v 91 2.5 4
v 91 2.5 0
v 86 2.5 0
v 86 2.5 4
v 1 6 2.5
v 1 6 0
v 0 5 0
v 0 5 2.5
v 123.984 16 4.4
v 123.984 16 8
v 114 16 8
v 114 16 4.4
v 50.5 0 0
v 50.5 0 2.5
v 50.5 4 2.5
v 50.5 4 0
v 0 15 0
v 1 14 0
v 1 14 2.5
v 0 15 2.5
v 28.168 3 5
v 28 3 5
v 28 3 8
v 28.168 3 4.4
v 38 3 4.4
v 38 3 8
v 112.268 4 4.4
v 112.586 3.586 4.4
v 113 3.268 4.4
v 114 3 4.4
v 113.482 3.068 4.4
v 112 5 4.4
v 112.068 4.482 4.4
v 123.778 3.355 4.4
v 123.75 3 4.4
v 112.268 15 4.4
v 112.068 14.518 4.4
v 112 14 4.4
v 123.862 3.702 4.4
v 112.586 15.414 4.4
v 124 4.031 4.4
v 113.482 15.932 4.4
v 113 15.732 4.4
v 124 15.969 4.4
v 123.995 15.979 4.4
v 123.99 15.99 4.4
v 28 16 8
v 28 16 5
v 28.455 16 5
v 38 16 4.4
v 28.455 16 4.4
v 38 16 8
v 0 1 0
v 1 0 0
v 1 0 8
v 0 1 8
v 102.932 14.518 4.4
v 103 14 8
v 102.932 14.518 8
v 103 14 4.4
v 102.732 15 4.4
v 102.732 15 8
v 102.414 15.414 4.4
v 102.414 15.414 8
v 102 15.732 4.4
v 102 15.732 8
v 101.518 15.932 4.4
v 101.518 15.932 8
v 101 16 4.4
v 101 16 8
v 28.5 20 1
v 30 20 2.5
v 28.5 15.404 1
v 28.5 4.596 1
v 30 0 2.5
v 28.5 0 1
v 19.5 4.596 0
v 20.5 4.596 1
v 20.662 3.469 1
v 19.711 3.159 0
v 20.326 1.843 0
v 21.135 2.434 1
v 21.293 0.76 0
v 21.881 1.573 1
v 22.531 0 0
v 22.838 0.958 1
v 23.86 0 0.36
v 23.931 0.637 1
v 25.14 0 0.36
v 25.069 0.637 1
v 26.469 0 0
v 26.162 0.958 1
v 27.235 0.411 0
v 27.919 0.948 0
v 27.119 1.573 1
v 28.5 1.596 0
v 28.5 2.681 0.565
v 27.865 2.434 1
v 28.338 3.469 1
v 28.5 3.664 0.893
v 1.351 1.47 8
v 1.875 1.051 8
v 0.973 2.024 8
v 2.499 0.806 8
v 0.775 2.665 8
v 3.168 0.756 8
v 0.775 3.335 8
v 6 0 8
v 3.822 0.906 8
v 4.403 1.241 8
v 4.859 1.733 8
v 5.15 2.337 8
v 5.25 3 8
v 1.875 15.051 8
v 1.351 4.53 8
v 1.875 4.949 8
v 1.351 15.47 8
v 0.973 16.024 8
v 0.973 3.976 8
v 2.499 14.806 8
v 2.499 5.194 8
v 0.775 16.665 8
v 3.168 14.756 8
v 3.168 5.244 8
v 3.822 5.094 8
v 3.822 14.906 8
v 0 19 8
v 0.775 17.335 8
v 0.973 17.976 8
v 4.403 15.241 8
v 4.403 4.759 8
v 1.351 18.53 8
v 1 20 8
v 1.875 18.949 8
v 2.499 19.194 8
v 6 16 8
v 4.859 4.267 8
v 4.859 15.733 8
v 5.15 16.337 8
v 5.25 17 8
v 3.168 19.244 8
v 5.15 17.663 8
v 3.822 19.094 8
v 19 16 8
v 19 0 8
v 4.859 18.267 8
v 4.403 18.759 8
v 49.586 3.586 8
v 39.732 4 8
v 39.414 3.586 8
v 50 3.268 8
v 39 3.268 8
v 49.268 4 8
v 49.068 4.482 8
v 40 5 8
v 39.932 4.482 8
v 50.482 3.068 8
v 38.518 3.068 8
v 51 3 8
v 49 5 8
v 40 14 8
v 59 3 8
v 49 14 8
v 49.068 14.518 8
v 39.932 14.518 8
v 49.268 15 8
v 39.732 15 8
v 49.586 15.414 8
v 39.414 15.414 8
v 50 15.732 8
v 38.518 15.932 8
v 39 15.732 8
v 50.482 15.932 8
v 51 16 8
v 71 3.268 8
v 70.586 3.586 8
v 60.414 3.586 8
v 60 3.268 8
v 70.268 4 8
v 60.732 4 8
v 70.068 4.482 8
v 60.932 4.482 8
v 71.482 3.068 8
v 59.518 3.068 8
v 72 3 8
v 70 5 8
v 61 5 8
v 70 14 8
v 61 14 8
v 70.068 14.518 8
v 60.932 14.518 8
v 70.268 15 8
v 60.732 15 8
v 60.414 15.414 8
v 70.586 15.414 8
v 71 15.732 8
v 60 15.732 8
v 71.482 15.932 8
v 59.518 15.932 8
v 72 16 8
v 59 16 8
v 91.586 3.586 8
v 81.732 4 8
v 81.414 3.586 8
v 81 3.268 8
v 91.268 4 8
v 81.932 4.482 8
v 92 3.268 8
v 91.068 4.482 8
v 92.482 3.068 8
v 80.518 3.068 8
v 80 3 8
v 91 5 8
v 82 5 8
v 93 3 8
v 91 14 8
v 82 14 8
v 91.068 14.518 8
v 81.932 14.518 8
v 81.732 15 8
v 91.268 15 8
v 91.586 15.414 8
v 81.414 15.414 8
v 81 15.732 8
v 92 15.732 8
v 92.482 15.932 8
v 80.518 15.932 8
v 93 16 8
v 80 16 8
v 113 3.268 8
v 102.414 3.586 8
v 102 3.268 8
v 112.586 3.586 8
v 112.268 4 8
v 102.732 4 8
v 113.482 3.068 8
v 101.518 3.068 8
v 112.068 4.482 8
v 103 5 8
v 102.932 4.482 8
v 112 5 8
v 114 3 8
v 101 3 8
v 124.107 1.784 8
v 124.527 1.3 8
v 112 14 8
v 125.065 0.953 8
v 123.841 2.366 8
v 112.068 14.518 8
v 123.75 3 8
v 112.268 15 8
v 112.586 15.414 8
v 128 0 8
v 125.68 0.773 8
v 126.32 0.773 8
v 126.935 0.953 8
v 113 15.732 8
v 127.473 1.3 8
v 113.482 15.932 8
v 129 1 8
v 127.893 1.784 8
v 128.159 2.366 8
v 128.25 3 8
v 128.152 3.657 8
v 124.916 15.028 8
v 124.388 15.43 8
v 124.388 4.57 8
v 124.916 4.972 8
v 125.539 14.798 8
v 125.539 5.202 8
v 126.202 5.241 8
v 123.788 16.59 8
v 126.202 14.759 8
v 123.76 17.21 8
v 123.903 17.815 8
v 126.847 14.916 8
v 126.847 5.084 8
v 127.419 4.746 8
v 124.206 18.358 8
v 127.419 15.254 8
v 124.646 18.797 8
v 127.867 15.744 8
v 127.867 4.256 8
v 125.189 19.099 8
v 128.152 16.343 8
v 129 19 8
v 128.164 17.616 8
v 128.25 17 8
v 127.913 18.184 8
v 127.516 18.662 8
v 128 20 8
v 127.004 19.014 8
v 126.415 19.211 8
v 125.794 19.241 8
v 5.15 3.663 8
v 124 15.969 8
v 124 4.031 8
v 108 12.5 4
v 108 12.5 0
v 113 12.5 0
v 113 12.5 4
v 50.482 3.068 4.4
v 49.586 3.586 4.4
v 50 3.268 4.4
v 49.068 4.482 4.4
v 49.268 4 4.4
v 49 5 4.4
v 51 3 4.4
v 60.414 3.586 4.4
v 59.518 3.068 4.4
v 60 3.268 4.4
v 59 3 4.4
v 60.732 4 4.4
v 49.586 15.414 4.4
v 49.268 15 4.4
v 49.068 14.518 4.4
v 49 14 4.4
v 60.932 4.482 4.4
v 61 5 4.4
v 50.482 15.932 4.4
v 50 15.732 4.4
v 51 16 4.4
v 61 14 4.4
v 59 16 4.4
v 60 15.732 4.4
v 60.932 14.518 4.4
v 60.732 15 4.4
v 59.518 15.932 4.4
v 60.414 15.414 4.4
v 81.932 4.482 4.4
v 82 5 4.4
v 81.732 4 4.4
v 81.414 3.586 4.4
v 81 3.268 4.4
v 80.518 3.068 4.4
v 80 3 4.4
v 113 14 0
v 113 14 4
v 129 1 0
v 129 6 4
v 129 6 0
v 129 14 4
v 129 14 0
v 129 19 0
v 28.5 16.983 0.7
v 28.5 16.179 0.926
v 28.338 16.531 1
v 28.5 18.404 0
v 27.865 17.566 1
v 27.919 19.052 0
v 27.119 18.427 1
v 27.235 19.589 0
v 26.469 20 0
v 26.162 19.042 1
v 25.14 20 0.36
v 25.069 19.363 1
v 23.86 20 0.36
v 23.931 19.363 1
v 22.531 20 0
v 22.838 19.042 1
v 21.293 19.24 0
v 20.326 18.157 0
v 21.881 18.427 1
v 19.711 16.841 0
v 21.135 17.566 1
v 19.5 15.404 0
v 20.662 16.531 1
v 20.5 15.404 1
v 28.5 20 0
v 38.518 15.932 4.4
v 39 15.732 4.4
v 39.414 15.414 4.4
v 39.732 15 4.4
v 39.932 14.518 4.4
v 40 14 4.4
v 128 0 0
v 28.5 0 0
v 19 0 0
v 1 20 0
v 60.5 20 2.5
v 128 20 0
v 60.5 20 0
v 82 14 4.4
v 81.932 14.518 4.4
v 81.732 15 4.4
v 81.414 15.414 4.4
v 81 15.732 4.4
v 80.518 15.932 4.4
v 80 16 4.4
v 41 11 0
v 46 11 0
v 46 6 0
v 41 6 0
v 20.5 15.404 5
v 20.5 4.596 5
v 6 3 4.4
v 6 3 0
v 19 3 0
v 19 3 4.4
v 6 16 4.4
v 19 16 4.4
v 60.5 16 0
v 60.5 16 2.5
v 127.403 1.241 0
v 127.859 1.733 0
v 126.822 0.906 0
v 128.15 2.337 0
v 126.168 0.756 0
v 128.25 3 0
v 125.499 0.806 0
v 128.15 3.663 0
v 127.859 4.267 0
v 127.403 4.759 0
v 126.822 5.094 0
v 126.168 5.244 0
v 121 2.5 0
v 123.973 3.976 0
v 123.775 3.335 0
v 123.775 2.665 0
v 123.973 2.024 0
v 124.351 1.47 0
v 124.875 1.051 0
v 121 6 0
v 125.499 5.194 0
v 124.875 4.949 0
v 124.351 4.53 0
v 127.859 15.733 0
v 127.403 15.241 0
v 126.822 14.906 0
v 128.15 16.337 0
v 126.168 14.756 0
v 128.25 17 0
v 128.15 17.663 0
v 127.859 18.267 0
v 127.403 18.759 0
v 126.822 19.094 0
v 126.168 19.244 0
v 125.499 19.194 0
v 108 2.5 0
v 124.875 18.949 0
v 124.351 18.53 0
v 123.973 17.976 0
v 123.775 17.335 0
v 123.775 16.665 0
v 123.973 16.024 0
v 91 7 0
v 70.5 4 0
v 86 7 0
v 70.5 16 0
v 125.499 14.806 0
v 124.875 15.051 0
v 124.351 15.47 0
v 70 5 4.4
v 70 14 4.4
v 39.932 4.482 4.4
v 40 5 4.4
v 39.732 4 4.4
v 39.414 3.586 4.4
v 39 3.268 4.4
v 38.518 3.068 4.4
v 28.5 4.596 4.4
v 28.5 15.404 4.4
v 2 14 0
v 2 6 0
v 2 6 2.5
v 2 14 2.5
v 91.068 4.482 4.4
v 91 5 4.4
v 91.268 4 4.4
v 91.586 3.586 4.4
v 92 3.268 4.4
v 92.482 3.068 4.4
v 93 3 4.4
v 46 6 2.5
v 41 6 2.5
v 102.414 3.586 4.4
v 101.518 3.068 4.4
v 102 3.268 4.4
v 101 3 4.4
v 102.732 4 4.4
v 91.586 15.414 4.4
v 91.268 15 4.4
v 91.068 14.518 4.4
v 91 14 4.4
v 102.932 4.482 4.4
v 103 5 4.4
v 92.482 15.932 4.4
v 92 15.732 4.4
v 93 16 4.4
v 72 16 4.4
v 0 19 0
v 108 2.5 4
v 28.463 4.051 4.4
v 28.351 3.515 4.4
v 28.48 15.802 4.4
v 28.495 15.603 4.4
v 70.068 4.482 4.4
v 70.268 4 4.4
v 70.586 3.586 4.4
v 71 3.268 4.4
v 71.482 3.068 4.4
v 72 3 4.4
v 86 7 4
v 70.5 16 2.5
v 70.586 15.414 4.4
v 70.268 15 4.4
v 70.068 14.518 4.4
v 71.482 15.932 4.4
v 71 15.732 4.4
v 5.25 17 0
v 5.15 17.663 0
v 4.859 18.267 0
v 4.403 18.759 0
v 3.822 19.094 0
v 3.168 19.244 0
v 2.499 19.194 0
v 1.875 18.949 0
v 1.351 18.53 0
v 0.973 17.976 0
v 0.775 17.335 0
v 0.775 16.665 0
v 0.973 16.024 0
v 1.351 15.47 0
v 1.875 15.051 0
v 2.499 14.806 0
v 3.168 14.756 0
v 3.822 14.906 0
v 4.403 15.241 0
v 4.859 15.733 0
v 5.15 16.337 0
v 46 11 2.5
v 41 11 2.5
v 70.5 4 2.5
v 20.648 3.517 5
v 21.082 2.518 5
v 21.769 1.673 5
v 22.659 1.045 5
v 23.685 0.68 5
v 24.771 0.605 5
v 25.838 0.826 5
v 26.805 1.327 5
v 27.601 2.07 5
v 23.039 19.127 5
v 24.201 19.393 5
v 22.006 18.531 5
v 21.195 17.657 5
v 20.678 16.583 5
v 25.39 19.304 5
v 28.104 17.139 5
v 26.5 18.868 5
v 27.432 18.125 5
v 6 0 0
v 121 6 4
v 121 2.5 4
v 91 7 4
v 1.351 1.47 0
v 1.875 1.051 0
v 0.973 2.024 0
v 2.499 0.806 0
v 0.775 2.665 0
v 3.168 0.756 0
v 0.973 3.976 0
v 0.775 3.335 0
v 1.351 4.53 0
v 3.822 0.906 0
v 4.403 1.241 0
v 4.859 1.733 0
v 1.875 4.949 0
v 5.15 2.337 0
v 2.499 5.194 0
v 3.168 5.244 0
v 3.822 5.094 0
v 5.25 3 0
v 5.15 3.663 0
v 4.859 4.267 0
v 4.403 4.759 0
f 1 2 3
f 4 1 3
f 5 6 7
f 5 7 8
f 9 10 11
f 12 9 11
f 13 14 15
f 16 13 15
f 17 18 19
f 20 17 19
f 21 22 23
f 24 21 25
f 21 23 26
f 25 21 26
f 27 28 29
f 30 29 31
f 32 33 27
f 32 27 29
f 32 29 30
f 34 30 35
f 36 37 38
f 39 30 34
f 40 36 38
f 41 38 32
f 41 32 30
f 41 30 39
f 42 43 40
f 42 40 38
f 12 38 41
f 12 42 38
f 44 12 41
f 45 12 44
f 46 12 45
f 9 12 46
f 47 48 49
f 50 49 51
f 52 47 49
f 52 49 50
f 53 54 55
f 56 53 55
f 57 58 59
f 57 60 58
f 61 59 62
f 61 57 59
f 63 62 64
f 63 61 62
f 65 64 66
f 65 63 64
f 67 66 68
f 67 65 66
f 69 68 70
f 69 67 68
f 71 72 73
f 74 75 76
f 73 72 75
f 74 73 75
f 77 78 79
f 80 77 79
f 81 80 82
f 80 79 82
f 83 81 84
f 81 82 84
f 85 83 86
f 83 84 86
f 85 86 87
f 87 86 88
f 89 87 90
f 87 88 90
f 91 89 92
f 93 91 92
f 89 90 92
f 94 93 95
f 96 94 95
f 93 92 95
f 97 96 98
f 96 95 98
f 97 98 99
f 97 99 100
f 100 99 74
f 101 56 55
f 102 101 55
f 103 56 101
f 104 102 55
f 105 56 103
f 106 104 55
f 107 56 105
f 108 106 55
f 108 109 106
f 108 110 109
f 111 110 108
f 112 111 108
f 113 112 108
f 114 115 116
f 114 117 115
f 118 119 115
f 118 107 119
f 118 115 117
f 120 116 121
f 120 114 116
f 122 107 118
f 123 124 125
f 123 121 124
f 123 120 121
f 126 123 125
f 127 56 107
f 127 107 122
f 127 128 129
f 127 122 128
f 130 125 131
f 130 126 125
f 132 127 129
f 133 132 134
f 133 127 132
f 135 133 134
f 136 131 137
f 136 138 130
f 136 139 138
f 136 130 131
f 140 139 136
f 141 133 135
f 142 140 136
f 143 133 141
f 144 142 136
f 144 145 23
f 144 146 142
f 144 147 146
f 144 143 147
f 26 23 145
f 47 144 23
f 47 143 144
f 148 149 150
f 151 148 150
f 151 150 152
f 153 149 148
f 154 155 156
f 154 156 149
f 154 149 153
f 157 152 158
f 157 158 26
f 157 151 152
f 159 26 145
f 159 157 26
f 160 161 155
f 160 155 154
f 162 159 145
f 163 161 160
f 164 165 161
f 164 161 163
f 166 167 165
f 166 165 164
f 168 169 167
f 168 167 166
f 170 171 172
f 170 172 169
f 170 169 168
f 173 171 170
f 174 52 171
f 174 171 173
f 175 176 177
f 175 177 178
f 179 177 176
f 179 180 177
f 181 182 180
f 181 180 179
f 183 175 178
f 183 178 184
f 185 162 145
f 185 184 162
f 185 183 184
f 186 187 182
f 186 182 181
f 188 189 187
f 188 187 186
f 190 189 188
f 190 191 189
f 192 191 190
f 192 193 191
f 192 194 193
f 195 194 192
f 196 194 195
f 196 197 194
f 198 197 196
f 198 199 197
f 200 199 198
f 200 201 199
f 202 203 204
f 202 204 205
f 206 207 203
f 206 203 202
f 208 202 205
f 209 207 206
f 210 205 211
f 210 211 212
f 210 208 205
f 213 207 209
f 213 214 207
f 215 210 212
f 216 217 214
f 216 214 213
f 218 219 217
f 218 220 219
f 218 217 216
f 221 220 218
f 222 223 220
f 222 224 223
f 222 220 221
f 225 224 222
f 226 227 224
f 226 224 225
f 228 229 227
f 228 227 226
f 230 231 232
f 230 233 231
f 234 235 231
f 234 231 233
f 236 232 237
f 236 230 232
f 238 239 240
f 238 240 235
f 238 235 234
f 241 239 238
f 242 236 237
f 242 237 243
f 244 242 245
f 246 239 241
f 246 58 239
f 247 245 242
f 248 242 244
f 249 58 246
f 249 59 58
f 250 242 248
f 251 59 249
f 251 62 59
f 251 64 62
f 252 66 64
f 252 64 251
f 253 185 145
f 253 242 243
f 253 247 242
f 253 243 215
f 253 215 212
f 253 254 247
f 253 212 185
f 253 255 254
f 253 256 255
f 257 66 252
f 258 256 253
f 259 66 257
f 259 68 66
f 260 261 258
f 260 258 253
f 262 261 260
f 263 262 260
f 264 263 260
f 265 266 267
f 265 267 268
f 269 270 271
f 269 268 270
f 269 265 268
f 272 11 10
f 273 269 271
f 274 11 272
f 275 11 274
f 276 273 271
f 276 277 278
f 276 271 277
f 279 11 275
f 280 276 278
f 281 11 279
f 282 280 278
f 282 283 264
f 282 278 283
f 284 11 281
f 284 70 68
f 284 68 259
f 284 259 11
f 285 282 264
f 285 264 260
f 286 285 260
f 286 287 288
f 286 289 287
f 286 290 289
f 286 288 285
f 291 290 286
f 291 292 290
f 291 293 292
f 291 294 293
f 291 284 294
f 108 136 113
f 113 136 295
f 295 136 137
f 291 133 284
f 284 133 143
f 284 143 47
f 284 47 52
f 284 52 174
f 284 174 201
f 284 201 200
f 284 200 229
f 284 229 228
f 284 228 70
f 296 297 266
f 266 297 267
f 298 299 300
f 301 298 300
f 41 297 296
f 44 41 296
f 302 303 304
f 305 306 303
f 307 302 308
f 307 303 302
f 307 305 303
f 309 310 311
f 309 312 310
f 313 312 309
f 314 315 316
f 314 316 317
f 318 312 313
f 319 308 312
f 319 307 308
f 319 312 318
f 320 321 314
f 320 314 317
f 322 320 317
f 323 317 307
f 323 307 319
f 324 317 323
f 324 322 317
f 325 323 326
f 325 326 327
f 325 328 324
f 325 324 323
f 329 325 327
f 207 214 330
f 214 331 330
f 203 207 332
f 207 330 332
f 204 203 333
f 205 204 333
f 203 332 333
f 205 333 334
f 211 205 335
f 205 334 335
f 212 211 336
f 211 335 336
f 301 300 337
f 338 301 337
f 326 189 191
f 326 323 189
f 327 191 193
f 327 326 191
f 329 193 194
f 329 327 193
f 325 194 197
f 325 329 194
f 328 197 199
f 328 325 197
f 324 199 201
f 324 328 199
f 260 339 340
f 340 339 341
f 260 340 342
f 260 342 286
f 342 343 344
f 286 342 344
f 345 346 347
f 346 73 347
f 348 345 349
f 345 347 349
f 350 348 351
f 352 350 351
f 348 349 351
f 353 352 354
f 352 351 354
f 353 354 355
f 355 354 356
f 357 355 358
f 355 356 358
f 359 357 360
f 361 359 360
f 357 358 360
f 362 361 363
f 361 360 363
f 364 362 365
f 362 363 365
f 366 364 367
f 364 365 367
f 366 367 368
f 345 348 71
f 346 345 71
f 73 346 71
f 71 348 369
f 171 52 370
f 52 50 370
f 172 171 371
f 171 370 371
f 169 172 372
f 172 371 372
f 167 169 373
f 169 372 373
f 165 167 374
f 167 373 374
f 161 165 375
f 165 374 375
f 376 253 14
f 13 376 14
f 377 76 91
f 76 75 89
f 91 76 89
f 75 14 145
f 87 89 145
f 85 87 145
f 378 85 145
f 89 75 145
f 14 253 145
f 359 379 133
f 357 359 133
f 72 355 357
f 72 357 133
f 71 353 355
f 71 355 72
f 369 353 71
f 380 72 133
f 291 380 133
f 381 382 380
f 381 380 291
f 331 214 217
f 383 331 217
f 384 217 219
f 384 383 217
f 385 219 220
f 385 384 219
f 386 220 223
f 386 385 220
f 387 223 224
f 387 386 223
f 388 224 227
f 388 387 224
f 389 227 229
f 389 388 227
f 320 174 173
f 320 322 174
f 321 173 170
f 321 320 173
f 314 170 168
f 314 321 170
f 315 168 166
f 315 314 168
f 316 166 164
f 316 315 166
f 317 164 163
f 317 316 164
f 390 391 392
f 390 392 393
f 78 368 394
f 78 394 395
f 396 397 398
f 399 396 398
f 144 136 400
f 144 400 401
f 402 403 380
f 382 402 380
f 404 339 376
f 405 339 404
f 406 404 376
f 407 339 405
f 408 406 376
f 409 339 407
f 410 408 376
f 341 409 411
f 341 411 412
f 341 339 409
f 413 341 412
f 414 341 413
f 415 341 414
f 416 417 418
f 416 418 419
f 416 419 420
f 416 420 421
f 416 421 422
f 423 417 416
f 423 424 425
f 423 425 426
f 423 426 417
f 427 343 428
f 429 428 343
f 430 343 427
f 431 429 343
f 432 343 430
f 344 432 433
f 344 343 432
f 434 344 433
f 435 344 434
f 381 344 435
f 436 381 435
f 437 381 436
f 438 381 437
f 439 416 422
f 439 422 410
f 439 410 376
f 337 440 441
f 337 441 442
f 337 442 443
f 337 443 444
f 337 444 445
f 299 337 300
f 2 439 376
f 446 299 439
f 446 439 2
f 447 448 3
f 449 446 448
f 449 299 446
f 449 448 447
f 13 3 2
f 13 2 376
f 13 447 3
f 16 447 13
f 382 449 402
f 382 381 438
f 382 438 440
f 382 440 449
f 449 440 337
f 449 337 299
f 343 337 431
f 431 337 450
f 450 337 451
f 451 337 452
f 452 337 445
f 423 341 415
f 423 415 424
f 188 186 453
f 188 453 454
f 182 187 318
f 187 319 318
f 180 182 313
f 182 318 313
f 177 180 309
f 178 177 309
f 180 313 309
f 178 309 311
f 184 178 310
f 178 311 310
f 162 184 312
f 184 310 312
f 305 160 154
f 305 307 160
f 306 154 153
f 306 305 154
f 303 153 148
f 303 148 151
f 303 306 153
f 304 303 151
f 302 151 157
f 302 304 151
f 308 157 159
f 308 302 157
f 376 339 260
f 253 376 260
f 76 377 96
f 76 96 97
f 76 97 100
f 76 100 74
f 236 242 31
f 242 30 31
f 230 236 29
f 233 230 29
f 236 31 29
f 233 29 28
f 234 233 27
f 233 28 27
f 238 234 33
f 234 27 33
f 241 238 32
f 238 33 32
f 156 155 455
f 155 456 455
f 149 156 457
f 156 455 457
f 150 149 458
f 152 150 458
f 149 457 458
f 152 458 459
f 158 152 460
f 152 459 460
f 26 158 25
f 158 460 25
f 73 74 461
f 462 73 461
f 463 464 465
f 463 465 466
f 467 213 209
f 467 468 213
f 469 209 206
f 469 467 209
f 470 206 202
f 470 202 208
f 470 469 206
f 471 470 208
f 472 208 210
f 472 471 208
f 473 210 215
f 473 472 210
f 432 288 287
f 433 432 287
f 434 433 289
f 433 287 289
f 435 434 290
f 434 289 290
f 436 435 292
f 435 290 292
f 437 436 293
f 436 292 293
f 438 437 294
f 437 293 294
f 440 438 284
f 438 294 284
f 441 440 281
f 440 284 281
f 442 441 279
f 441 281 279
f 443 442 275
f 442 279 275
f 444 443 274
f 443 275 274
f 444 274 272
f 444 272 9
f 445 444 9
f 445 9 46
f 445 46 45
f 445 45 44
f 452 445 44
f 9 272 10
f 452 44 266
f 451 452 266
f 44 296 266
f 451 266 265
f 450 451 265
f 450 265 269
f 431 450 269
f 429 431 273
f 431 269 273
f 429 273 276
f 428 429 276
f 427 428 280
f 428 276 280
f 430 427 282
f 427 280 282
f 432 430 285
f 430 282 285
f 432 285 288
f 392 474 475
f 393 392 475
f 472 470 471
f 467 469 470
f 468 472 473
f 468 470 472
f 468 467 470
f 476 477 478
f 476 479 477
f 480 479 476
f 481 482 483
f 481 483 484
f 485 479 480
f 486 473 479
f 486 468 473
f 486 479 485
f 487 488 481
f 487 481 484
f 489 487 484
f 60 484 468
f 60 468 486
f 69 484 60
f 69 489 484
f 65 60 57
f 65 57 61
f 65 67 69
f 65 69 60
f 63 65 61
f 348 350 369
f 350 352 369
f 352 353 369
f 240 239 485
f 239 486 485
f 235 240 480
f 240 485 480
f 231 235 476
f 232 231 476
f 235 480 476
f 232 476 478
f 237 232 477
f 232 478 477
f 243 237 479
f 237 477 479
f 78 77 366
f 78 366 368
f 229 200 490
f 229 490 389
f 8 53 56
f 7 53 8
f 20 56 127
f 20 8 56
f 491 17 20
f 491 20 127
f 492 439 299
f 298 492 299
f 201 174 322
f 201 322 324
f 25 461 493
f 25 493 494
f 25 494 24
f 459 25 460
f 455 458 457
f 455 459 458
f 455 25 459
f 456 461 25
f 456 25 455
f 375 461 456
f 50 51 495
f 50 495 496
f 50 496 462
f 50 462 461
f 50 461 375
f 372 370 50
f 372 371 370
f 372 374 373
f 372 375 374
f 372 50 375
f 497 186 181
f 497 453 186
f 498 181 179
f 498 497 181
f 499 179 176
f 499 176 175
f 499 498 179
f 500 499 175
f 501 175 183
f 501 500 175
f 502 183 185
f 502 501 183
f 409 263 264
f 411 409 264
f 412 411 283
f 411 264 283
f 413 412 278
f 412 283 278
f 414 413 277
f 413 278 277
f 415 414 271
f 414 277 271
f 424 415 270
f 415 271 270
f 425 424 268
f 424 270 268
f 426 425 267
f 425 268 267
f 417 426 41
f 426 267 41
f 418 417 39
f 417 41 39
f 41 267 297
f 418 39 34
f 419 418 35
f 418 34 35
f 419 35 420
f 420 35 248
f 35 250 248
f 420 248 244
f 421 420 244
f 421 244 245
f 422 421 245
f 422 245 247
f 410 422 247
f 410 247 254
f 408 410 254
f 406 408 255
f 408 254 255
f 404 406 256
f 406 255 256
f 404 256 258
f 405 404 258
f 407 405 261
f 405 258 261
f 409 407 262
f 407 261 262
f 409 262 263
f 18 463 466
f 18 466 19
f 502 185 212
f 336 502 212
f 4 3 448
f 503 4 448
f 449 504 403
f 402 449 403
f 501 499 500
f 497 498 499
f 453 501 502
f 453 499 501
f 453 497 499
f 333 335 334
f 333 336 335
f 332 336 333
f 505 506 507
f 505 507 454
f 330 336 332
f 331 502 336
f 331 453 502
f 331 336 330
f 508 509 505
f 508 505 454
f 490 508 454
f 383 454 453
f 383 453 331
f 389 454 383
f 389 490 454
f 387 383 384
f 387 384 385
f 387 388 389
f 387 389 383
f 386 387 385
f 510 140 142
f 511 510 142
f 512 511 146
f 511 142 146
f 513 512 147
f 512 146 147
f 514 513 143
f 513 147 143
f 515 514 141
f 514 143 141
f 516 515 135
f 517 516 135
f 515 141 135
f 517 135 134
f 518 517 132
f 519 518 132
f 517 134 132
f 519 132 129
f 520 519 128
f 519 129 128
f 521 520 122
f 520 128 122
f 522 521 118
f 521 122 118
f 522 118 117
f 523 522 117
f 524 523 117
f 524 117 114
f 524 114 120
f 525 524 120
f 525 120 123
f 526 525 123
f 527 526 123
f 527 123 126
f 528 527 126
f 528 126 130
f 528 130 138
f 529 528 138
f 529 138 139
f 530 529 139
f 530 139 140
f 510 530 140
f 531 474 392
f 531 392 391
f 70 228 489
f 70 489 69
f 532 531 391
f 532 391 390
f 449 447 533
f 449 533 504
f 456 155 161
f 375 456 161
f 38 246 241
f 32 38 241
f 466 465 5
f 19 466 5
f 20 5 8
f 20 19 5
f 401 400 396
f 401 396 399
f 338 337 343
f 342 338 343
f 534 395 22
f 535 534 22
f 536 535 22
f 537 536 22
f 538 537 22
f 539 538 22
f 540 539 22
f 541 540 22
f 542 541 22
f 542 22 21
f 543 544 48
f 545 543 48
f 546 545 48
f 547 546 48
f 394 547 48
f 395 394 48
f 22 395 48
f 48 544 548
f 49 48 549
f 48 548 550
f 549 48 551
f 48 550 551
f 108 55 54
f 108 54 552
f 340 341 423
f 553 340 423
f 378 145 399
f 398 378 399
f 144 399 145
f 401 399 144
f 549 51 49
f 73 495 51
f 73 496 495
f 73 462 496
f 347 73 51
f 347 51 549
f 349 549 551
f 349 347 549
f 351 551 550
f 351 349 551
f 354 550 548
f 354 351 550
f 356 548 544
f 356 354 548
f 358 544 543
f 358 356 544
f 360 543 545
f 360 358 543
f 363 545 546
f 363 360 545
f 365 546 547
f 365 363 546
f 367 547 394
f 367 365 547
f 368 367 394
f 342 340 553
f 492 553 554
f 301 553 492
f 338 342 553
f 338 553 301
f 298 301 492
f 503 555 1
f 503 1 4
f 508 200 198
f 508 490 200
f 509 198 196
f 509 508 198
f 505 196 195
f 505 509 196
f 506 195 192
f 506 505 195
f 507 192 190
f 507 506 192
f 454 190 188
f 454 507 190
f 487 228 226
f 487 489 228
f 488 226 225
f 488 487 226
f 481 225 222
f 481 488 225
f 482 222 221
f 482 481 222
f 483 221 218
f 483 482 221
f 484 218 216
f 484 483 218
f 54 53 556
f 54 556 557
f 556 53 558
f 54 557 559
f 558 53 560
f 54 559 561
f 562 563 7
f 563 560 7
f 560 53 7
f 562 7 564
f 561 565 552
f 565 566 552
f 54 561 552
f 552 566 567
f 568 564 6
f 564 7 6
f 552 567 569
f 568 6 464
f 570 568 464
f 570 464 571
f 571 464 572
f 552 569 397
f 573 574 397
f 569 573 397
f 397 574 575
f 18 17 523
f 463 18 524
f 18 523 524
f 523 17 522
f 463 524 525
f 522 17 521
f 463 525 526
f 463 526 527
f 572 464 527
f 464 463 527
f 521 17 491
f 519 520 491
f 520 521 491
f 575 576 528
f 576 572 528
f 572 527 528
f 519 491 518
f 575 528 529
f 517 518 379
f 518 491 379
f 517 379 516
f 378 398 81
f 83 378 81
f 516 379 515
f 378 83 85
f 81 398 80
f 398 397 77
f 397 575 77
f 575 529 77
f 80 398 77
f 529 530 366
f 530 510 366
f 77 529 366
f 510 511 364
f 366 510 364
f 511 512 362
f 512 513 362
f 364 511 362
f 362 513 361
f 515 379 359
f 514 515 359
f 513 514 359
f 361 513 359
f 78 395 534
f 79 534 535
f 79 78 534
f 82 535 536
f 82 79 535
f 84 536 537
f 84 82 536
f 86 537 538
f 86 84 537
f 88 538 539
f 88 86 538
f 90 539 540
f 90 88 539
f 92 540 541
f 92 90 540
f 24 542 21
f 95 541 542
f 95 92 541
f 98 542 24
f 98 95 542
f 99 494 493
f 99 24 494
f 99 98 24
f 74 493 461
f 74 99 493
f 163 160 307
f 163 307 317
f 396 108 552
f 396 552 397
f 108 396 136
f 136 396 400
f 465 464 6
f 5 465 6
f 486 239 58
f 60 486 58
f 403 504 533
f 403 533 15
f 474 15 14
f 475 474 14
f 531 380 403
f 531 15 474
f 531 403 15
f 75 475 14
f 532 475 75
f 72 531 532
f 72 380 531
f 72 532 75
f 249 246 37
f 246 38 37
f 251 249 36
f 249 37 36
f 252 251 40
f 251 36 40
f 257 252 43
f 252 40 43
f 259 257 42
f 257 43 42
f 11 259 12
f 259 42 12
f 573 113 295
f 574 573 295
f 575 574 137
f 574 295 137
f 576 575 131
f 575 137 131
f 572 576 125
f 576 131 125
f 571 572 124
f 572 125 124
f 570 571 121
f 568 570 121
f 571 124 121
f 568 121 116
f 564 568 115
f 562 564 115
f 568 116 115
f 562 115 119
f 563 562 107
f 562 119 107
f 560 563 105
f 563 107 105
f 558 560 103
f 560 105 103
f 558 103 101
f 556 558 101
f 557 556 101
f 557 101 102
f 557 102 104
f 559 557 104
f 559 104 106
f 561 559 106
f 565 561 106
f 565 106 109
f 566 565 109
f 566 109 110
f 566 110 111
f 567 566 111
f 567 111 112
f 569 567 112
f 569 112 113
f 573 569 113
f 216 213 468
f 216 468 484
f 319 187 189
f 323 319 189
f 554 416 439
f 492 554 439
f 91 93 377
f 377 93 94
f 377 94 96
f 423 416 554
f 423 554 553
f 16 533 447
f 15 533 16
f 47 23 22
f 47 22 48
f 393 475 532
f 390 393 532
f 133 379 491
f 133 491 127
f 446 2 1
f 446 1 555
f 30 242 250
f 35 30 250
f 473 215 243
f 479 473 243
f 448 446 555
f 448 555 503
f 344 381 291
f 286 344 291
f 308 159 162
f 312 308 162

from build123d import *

# Parameters (mm, degrees)
SKETCH1_W               = 129
SKETCH1_H               = 20
BOSS_EXTRUDE1_DEPTH     = 8
SKETCH2_W               = 13
SKETCH2_H               = 15
SKETCH2_W_2             = 12
SKETCH2_H_2             = 13
CUT_EXTRUDE4_DEPTH      = 3.6
SKETCH2_5_R             = 2.25
CUT_EXTRUDE7_DEPTH      = 131.786084887
CUT_EXTRUDE8_DEPTH      = 131.615313038
CUT_EXTRUDE8_DEPTH_BACK = 131.615313038
SKETCH3_W               = 13
SKETCH3_H               = 3
CUT_EXTRUDE9_DEPTH      = 5
CHAMFER1_SIZE           = 1
SKETCH5_W               = 42
SKETCH5_H               = 20
SKETCH5_W_2             = 2
SKETCH5_H_2             = 8
CUT_EXTRUDE10_DEPTH     = 2.5
CHAMFER2_DEPTH          = 20
SKETCH6_W               = 5
SKETCH6_H               = 4.5
SKETCH6_W_2             = 8
SKETCH6_H_2             = 3.5
CUT_EXTRUDE11_DEPTH     = 4
SKETCH7_W               = 20
SKETCH7_H               = 4
SKETCH7_W_2             = 10
SKETCH7_W_3             = 5
SKETCH7_H_2             = 5
BOSS_EXTRUDE2_DEPTH     = 2.5
CHAMFER3_SIZE           = 1
FILLET1_R               = 2
CHAMFER4_SIZE           = 1


with BuildPart() as part:
    # Sketch1 → Boss-Extrude1 (new body)
    with BuildSketch(Plane.XY):
        with Locations((64.5, 10)):
            Rectangle(SKETCH1_W, SKETCH1_H)
    extrude(amount=BOSS_EXTRUDE1_DEPTH)

    # Sketch2 → Cut-Extrude4 (cut)
    with BuildSketch(Plane.XY.offset(8)):
        with Locations((12.5, 8.5)):
            Rectangle(SKETCH2_W, SKETCH2_H)
        with Locations((55, 9.5)):
            Rectangle(SKETCH2_W_2, SKETCH2_H_2)
        with Locations((34, 9.5)):
            Rectangle(SKETCH2_W_2, SKETCH2_H_2)
        with Locations((76, 9.5)):
            Rectangle(SKETCH2_W_2, SKETCH2_H_2)
        with Locations((97, 9.5)):
            Rectangle(SKETCH2_W_2, SKETCH2_H_2)
        with BuildLine():
            Line((112, 16), (112, 3))
            Line((112, 3), (123.75, 3))
            ThreePointArc((123.75, 3), (123.813393039, 3.530330086), (124, 4.030776406))
            Line((124, 4.030776406), (124, 15.969223594))
            ThreePointArc((124, 15.969223594), (123.992158813, 15.984581975), (123.984435563, 16))
            Line((123.984435563, 16), (112, 16))
        make_face()
    extrude(amount=-CUT_EXTRUDE4_DEPTH, mode=Mode.SUBTRACT)

    # Sketch2<5> → Cut-Extrude7 (cut, through all)
    with BuildSketch(Plane.XY.offset(8)):
        with Locations((126, 3)):
            Circle(SKETCH2_5_R)
        with Locations((126, 17)):
            Circle(SKETCH2_5_R)
        with Locations((3, 17)):
            Circle(SKETCH2_5_R)
        with Locations((3, 3)):
            Circle(SKETCH2_5_R)
    extrude(amount=-CUT_EXTRUDE7_DEPTH, mode=Mode.SUBTRACT)

    # Sketch3 → Cut-Extrude8 (cut, two sides: drawn at the far end of the back side and taken through both)
    with BuildSketch(Plane.XY.offset(4.4).offset(-CUT_EXTRUDE8_DEPTH_BACK)):
        with Locations((12.5, 1.5)):
            Rectangle(SKETCH3_W, SKETCH3_H)
    extrude(amount=CUT_EXTRUDE8_DEPTH + CUT_EXTRUDE8_DEPTH_BACK, mode=Mode.SUBTRACT)

    # Sketch4 → Cut-Extrude9 (cut)
    with BuildSketch(Plane(origin=(0, 0, 0), x_dir=(-1, 0, 0), z_dir=(0, 0, -1))):
        with BuildLine():
            Line((-28.5, 4.596136616), (-28.5, 15.403863384))
            ThreePointArc((-28.5, 15.403863384), (-24.5, 19.403863384), (-20.5, 15.403863384))
            Line((-20.5, 15.403863384), (-20.5, 4.596136616))
            ThreePointArc((-20.5, 4.596136616), (-24.5, 0.596136616), (-28.5, 4.596136616))
        make_face()
    extrude(amount=-CUT_EXTRUDE9_DEPTH, mode=Mode.SUBTRACT)

    # Chamfer1
    # the kernel refuses this chamfer: 1 mm, written as the material it takes off along each edge
    with BuildSketch(Plane(origin=(24.5, 4.596136616, 0), x_dir=(-1, 0, 0), z_dir=(0, 1, 0))) as chamfer1_piece_1:
        Polygon((4 + CHAMFER1_SIZE, 0), (4, CHAMFER1_SIZE), (4, 0), align=None)
    revolve(axis=Axis((24.5, 4.596136616, 0), (0, 0, 1)), revolution_arc=180, mode=Mode.SUBTRACT)
    with BuildSketch(Plane(origin=(20.5, 15.403863384, 0), x_dir=(-1, 0, 0), z_dir=(0, -1, 0)), Plane(origin=(28.5, 4.596136616, 0), x_dir=(1, 0, 0), z_dir=(0, 1, 0))) as chamfer1_piece_2:
        Polygon((CHAMFER1_SIZE, 0), (0, -CHAMFER1_SIZE), (0, 0), align=None)
    extrude(amount=10.807726767, mode=Mode.SUBTRACT)
    with BuildSketch(Plane(origin=(24.5, 15.403863384, 0), x_dir=(1, 0, 0), z_dir=(0, -1, 0))) as chamfer1_piece_3:
        Polygon((4 + CHAMFER1_SIZE, 0), (4, CHAMFER1_SIZE), (4, 0), align=None)
    revolve(axis=Axis((24.5, 15.403863384, 0), (0, 0, 1)), revolution_arc=180, mode=Mode.SUBTRACT)

    # Sketch5 → Cut-Extrude10 (cut)
    with BuildSketch(Plane(origin=(0, 0, 0), x_dir=(-1, 0, 0), z_dir=(0, 0, -1))):
        with Locations((-49.5, 10)):
            Rectangle(SKETCH5_W, SKETCH5_H)
        with Locations((-1, 10)):
            Rectangle(SKETCH5_W_2, SKETCH5_H_2)
    extrude(amount=-CUT_EXTRUDE10_DEPTH, mode=Mode.SUBTRACT)

    # Chamfer2: read off the stored shape, not the designer's step
    # Chamfer2 outline → Chamfer2 (add)
    with BuildSketch(Plane(origin=(0, 0, 0), x_dir=(1, 0, 0), z_dir=(0, 1, 0))):
        Polygon((28.5, -1), (28.5, -2.5), (30, -2.5), align=None)
    extrude(amount=CHAMFER2_DEPTH)

    # Sketch6 → Cut-Extrude11 (cut)
    with BuildSketch(Plane(origin=(0, 0, 0), x_dir=(-1, 0, 0), z_dir=(0, 0, -1))):
        with Locations((-88.5, 4.75)):
            Rectangle(SKETCH6_W, SKETCH6_H)
        Polygon((-113, 2.5), (-108, 2.5), (-108, 12.5), (-113, 12.5), (-113, 10), (-113, 6), align=None)
        with Locations((-117, 4.25)):
            Rectangle(SKETCH6_W_2, SKETCH6_H_2)
        Polygon((-121, 6), (-113, 6), (-113, 10), (-129, 10), (-129, 6), align=None)
        Polygon((-113, 10), (-113, 12.5), (-113, 14), (-129, 14), (-129, 10), align=None)
    extrude(amount=-CUT_EXTRUDE11_DEPTH, mode=Mode.SUBTRACT)

    # Sketch7 → Boss-Extrude2 (add)
    with BuildSketch(Plane(origin=(0, 0, 2.5), x_dir=(-1, 0, 0), z_dir=(0, 0, -1))):
        with Locations((-60.5, 2)):
            Rectangle(SKETCH7_W, SKETCH7_H)
        with Locations((-65.5, 18)):
            Rectangle(SKETCH7_W_2, SKETCH7_H)
        with Locations((-43.5, 8.5)):
            Rectangle(SKETCH7_W_3, SKETCH7_H_2)
    extrude(amount=BOSS_EXTRUDE2_DEPTH)

    # Chamfer3
    chamfer3_edges = [part.edges().sort_by_distance(p)[0] for p in [
        (0, 14, 1.25),
        (0, 6, 1.25),
    ]]
    chamfer(chamfer3_edges, length=CHAMFER3_SIZE)

    # Fillet1
    fillet1_edges = [part.edges().sort_by_distance(p)[0] for p in [
        (112, 3, 6.2),
        (112, 16, 6.2),
        (70, 16, 6.2),
        (82, 16, 6.2),
        (82, 3, 6.2),
        (70, 3, 6.2),
        (40, 16, 6.2),
        (40, 3, 6.2),
        (61, 16, 6.2),
        (61, 3, 6.2),
        (49, 3, 6.2),
        (49, 16, 6.2),
        (103, 16, 6.2),
        (103, 3, 6.2),
        (91, 3, 6.2),
        (91, 16, 6.2),
    ]]
    fillet(fillet1_edges, radius=FILLET1_R)

    # Chamfer4
    chamfer4_edges = [part.edges().sort_by_distance(p)[0] for p in [
        (0, 20, 4),
        (129, 20, 4),
        (129, 0, 4),
        (0, 0, 4),
    ]]
    chamfer(chamfer4_edges, length=CHAMFER4_SIZE)


solid = part.part
